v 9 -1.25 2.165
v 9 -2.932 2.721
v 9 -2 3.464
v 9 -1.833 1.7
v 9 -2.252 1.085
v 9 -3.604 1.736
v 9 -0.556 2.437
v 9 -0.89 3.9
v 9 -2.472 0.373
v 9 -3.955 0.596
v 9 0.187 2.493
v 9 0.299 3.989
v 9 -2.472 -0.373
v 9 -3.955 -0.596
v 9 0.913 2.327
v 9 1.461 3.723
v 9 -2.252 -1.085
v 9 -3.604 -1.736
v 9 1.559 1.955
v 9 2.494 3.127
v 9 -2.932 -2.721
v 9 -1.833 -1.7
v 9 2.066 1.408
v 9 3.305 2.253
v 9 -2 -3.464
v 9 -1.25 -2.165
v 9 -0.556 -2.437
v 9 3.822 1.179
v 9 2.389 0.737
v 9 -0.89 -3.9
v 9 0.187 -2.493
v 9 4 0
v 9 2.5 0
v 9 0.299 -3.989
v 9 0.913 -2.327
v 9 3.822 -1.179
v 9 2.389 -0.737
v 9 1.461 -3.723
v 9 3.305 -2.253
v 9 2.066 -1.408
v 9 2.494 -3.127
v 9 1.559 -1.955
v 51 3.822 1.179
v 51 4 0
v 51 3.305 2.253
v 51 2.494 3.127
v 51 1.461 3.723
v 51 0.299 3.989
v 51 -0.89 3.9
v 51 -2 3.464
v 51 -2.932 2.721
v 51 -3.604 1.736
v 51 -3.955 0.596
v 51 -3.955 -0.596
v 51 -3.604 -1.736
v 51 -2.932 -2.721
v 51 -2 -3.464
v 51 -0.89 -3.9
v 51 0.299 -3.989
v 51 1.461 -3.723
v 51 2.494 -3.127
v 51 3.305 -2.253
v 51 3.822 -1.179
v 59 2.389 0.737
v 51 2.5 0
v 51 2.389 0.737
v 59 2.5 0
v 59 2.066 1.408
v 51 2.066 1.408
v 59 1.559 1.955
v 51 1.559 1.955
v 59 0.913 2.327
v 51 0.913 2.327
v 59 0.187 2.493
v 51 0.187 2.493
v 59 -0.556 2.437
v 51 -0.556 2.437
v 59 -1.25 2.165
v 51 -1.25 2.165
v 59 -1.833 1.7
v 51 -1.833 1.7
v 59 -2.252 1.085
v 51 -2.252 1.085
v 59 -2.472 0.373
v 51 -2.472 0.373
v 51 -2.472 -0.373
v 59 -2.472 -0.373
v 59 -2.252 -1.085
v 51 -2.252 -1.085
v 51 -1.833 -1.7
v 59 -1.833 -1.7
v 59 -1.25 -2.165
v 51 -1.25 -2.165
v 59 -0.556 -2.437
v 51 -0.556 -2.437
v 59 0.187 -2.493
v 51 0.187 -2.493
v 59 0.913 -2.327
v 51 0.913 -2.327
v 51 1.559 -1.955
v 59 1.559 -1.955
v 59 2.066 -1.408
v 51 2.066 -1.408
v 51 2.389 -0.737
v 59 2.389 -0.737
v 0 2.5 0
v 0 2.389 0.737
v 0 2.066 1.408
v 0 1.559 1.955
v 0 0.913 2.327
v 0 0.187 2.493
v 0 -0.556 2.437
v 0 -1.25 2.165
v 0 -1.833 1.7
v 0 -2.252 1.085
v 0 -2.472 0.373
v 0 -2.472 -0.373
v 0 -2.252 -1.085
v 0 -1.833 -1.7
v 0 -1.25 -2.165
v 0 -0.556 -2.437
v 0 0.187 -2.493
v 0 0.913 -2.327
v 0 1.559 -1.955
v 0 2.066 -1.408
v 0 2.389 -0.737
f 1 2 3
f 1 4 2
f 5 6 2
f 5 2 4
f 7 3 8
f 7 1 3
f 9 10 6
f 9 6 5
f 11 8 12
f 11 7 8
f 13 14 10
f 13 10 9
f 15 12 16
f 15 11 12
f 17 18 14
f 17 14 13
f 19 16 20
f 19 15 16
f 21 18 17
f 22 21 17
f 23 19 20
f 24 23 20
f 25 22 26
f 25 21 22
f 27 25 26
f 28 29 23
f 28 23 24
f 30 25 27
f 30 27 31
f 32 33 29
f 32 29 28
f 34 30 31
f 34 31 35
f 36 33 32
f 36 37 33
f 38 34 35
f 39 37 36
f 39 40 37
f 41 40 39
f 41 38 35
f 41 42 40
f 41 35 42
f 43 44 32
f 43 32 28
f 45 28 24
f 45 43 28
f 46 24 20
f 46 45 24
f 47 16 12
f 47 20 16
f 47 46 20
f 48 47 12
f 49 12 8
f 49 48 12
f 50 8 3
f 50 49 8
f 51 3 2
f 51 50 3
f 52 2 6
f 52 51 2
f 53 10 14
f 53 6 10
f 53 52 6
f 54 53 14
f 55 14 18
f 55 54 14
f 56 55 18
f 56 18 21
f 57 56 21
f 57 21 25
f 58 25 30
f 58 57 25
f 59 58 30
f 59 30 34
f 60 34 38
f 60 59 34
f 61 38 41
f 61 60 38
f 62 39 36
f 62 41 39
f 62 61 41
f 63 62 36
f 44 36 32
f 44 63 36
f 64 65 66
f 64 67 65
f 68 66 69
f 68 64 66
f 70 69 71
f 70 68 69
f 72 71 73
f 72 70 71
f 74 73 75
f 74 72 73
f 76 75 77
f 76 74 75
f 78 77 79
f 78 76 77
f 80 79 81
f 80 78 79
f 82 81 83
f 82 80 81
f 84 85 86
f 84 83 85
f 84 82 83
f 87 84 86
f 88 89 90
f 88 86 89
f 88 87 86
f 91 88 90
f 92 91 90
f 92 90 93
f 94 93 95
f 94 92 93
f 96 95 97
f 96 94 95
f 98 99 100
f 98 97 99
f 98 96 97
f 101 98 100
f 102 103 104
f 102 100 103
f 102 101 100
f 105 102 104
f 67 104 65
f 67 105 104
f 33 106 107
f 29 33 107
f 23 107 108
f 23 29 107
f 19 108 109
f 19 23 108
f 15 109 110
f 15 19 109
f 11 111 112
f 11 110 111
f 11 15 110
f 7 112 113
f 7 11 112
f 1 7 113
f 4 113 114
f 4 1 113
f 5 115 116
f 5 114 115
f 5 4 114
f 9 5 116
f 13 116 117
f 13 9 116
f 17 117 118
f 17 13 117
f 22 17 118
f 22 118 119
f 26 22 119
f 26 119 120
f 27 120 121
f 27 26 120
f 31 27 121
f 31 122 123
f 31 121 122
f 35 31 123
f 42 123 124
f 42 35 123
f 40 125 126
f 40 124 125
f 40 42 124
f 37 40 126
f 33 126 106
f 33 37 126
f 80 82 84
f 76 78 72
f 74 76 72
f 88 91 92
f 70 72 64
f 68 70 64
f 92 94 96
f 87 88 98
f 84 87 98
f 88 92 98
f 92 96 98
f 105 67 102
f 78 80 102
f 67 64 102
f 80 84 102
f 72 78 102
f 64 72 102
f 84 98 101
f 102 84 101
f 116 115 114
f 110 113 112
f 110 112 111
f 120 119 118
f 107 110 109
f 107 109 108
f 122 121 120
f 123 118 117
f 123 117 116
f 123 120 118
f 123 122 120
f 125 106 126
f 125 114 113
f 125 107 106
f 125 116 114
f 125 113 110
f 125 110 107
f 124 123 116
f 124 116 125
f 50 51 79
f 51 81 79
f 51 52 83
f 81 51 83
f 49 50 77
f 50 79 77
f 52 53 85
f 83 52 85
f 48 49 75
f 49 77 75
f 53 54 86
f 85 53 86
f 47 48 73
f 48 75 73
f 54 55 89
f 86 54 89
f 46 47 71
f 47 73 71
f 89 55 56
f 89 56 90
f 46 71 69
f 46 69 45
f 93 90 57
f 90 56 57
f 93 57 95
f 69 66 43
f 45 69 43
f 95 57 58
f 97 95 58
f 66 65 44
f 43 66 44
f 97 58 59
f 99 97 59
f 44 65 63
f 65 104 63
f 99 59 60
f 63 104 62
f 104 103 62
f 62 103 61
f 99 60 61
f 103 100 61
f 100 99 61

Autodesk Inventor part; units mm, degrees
ref_plane "YZ Plane" through (0, 0, 0) normal (1, 0, 0) x (0, 1, 0)
ref_plane "XZ Plane" through (0, 0, 0) normal (0, 1, 0) x (-1, 0, 0)
ref_plane "XY Plane" through (0, 0, 0) normal (0, 0, 1) x (1, 0, 0)
sketch "Sketch2" plane through (0, 0, 0) normal (0, 0, 1) x (1, 0, 0)
  line L0 (0, 0) -> (0, 2.5)
  line L1 (0, 2.5) -> (9, 2.5)
  line L2 (9, 2.5) -> (9, 4)
  line L3 (9, 4) -> (51, 4)
  line L4 (51, 4) -> (51, 2.5)
  line L5 (51, 2.5) -> (59, 2.5)
  line L6 (59, 2.5) -> (59, 0)
  line L7 (59, 0) -> (0, 0)
  dimension "d0" = 5
  dimension "d1" = 8
  dimension "d2" = 9
  dimension "d3" = 8
  dimension "d4" = 42
revolve "Revolution1" add sketch "Sketch2" angle 360 about axis through (59, 0, 0) along (-1, 0, 0)
thread "Thread1" size "M5x0.8" class "6g" standard "ISO Metric profile" full length
thread "Thread2" size "M5x0.8" class "6g" standard "ISO Metric profile" full length
properties part number "46"
